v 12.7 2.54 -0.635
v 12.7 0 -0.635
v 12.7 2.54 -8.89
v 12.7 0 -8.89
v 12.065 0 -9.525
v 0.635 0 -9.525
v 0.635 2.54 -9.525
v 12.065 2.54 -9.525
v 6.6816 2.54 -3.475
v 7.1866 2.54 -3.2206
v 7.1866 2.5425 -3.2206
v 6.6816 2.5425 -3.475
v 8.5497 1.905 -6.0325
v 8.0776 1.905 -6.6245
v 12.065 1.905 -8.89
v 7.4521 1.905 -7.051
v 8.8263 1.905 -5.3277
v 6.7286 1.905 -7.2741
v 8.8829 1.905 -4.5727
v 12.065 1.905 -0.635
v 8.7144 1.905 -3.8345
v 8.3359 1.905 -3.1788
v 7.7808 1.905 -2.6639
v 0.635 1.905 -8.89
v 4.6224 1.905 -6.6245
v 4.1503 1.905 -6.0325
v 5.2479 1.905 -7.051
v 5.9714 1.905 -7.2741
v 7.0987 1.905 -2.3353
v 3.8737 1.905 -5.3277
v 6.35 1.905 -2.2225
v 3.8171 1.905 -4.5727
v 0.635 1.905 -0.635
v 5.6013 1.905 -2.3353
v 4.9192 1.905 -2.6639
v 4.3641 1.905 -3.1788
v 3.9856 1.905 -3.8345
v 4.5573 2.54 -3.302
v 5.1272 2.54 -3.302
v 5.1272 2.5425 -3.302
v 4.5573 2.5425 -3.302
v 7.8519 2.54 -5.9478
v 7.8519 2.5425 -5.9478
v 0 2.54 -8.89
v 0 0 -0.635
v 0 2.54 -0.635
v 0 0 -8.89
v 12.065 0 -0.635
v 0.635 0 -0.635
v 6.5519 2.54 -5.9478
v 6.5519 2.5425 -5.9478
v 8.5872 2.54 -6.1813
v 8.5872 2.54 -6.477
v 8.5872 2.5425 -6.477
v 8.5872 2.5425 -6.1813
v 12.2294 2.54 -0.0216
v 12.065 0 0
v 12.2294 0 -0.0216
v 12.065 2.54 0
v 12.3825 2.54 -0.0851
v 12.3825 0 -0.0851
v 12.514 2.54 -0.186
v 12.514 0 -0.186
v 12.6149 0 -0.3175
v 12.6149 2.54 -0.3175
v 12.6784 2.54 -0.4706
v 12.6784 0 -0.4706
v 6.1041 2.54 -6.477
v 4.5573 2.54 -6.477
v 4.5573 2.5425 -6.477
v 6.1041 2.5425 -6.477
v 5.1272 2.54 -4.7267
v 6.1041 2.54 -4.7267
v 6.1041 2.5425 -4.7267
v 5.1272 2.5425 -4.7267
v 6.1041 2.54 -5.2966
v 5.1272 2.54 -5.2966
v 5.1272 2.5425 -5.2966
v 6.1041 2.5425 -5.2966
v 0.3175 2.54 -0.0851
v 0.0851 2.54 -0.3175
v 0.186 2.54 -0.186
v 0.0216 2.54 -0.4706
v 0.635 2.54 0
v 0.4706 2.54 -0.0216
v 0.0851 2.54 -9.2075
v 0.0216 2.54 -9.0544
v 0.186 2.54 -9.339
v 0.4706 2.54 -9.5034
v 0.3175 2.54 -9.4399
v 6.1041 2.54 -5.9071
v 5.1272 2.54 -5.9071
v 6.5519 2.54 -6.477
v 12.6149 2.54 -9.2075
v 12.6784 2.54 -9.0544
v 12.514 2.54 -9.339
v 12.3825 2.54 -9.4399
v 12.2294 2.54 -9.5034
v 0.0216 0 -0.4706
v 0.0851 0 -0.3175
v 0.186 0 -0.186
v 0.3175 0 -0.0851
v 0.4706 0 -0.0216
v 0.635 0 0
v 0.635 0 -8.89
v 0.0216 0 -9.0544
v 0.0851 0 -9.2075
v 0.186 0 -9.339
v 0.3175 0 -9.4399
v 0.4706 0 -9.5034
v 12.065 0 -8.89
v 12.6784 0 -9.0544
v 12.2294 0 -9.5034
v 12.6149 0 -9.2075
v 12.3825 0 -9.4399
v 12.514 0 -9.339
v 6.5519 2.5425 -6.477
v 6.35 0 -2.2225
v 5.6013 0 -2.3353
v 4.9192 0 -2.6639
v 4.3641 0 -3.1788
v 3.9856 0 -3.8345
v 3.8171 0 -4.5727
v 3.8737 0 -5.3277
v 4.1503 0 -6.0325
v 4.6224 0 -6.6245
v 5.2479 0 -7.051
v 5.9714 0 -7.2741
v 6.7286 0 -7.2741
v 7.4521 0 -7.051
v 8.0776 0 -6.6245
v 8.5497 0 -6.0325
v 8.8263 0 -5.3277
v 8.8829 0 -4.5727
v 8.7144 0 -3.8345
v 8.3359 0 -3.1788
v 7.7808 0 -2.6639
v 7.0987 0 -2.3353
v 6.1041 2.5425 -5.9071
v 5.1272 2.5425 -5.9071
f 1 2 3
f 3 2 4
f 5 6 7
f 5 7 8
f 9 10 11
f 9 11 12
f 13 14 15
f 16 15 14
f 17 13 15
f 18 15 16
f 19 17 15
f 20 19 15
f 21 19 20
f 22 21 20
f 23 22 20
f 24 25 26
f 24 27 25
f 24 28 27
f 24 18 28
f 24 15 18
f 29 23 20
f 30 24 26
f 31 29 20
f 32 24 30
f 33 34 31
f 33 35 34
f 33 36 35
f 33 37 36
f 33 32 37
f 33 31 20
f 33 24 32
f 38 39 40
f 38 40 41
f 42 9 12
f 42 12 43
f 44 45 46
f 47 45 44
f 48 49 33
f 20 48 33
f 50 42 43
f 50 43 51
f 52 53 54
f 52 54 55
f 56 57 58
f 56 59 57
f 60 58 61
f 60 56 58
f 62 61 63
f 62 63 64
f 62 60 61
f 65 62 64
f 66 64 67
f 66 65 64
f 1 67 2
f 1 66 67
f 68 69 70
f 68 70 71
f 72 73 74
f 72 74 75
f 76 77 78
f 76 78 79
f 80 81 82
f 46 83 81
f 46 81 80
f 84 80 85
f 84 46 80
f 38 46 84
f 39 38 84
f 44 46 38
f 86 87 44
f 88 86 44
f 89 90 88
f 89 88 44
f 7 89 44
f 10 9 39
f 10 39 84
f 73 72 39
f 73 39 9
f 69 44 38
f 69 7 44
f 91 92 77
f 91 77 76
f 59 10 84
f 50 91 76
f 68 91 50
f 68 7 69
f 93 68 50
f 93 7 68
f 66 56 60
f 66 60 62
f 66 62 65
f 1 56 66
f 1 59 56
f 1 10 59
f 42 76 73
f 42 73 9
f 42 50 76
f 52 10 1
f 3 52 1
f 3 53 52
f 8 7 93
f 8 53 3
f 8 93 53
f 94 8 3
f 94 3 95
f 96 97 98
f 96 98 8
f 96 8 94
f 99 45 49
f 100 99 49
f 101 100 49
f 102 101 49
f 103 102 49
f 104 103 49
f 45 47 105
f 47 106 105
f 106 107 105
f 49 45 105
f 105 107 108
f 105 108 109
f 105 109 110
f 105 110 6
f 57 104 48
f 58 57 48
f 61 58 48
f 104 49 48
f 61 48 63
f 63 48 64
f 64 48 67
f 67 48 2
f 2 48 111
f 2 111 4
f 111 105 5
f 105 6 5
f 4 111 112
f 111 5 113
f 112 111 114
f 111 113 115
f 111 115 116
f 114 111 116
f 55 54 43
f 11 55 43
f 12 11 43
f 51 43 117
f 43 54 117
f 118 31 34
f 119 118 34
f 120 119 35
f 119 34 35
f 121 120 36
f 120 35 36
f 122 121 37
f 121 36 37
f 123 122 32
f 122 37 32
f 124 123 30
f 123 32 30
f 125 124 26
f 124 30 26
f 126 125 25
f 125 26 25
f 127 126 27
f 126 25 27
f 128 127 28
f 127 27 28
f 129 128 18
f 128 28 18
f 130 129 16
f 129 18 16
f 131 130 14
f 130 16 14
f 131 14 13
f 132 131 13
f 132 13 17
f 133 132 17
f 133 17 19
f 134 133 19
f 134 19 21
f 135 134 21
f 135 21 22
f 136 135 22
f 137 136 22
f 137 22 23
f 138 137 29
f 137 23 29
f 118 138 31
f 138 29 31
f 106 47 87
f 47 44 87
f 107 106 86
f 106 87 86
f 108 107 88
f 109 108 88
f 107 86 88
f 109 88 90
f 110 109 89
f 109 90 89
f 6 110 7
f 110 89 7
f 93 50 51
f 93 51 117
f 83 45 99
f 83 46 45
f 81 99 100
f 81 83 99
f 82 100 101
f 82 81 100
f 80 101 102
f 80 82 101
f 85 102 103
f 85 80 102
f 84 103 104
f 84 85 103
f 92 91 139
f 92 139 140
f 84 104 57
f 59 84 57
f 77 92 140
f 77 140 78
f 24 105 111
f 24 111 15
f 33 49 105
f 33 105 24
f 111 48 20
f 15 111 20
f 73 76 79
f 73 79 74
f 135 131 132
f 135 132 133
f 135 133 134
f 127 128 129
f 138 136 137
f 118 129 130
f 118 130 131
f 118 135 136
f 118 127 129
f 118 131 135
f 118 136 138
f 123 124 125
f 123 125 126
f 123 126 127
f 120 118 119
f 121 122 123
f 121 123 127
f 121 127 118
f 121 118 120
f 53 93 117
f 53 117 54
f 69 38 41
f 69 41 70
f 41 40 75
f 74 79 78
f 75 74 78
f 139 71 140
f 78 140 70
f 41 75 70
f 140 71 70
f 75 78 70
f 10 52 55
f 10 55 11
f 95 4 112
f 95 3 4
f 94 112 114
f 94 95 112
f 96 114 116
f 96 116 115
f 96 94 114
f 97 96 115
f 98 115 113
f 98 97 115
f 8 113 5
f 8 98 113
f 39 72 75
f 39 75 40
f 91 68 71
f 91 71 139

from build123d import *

# Parameters (mm, degrees)
SKETCH1_W           = 12.7
SKETCH1_H           = 9.525
BOSS_EXTRUDE1_DEPTH = 2.54
FILLET1_R           = 0.635
SHELL1_START        = 0.635
SHELL1_OUTLINE_W    = 1.905
SHELL1_OUTLINE_H    = 8.255
SHELL1_DEPTH        = 11.43
SKETCH2_R           = 2.54
BOSS_EXTRUDE2_DEPTH = 1.905
BOSS_EXTRUDE3_DEPTH = 0.00254


# Read off the part's stored shape, not the designer's step: Shell1
with BuildPart() as part:
    # Sketch1 → Boss-Extrude1 (new body)
    with BuildSketch(Plane(origin=(0, 0, 0), x_dir=(1, 0, 0), z_dir=(0, 1, 0))):
        with Locations((6.35, 4.7625)):
            Rectangle(SKETCH1_W, SKETCH1_H)
    extrude(amount=BOSS_EXTRUDE1_DEPTH)

    # Fillet1
    fillet1_edges = [part.edges().sort_by_distance(p)[0] for p in [
        (0, 1.27, -9.525),
        (12.7, 1.27, -9.525),
        (12.7, 1.27, 0),
        (0, 1.27, 0),
    ]]
    fillet(fillet1_edges, radius=FILLET1_R)

    # Shell1 outline → Shell1 (cut)
    with BuildSketch(Plane.YZ.offset(SHELL1_START)):
        with Locations((0.9525, -4.7625)):
            Rectangle(SHELL1_OUTLINE_W, SHELL1_OUTLINE_H)
    extrude(amount=SHELL1_DEPTH, mode=Mode.SUBTRACT)

    # Sketch2 → Boss-Extrude2 (add)
    with BuildSketch(Plane(origin=(0, 1.905, 0), x_dir=(-1, 0, 0), z_dir=(0, -1, 0))):
        with Locations(Location((-6.35, 4.7625, 0), (0, 0, 270))):
            Circle(SKETCH2_R)
    extrude(amount=BOSS_EXTRUDE2_DEPTH)

    # Sketch3 → Boss-Extrude3 (add)
    with BuildSketch(Plane(origin=(0, 2.54, 0), x_dir=(1, 0, 0), z_dir=(0, 1, 0))):
        Polygon((4.557346154, 6.477), (6.104141026, 6.477), (6.104141026, 5.907128205), (5.127217949, 5.907128205), (5.127217949, 5.296551282), (6.104141026, 5.296551282), (6.104141026, 4.726679487), (5.127217949, 4.726679487), (5.127217949, 3.302), (4.557346154, 3.302), align=None)
        Polygon((6.551897436, 6.477), (8.587153846, 6.477), (8.587153846, 6.181251803), (7.186643029, 3.220589744), (6.681645032, 3.474996795), (7.851917468, 5.947833333), (6.551897436, 5.947833333), align=None)
    extrude(amount=BOSS_EXTRUDE3_DEPTH)


solid = part.part
